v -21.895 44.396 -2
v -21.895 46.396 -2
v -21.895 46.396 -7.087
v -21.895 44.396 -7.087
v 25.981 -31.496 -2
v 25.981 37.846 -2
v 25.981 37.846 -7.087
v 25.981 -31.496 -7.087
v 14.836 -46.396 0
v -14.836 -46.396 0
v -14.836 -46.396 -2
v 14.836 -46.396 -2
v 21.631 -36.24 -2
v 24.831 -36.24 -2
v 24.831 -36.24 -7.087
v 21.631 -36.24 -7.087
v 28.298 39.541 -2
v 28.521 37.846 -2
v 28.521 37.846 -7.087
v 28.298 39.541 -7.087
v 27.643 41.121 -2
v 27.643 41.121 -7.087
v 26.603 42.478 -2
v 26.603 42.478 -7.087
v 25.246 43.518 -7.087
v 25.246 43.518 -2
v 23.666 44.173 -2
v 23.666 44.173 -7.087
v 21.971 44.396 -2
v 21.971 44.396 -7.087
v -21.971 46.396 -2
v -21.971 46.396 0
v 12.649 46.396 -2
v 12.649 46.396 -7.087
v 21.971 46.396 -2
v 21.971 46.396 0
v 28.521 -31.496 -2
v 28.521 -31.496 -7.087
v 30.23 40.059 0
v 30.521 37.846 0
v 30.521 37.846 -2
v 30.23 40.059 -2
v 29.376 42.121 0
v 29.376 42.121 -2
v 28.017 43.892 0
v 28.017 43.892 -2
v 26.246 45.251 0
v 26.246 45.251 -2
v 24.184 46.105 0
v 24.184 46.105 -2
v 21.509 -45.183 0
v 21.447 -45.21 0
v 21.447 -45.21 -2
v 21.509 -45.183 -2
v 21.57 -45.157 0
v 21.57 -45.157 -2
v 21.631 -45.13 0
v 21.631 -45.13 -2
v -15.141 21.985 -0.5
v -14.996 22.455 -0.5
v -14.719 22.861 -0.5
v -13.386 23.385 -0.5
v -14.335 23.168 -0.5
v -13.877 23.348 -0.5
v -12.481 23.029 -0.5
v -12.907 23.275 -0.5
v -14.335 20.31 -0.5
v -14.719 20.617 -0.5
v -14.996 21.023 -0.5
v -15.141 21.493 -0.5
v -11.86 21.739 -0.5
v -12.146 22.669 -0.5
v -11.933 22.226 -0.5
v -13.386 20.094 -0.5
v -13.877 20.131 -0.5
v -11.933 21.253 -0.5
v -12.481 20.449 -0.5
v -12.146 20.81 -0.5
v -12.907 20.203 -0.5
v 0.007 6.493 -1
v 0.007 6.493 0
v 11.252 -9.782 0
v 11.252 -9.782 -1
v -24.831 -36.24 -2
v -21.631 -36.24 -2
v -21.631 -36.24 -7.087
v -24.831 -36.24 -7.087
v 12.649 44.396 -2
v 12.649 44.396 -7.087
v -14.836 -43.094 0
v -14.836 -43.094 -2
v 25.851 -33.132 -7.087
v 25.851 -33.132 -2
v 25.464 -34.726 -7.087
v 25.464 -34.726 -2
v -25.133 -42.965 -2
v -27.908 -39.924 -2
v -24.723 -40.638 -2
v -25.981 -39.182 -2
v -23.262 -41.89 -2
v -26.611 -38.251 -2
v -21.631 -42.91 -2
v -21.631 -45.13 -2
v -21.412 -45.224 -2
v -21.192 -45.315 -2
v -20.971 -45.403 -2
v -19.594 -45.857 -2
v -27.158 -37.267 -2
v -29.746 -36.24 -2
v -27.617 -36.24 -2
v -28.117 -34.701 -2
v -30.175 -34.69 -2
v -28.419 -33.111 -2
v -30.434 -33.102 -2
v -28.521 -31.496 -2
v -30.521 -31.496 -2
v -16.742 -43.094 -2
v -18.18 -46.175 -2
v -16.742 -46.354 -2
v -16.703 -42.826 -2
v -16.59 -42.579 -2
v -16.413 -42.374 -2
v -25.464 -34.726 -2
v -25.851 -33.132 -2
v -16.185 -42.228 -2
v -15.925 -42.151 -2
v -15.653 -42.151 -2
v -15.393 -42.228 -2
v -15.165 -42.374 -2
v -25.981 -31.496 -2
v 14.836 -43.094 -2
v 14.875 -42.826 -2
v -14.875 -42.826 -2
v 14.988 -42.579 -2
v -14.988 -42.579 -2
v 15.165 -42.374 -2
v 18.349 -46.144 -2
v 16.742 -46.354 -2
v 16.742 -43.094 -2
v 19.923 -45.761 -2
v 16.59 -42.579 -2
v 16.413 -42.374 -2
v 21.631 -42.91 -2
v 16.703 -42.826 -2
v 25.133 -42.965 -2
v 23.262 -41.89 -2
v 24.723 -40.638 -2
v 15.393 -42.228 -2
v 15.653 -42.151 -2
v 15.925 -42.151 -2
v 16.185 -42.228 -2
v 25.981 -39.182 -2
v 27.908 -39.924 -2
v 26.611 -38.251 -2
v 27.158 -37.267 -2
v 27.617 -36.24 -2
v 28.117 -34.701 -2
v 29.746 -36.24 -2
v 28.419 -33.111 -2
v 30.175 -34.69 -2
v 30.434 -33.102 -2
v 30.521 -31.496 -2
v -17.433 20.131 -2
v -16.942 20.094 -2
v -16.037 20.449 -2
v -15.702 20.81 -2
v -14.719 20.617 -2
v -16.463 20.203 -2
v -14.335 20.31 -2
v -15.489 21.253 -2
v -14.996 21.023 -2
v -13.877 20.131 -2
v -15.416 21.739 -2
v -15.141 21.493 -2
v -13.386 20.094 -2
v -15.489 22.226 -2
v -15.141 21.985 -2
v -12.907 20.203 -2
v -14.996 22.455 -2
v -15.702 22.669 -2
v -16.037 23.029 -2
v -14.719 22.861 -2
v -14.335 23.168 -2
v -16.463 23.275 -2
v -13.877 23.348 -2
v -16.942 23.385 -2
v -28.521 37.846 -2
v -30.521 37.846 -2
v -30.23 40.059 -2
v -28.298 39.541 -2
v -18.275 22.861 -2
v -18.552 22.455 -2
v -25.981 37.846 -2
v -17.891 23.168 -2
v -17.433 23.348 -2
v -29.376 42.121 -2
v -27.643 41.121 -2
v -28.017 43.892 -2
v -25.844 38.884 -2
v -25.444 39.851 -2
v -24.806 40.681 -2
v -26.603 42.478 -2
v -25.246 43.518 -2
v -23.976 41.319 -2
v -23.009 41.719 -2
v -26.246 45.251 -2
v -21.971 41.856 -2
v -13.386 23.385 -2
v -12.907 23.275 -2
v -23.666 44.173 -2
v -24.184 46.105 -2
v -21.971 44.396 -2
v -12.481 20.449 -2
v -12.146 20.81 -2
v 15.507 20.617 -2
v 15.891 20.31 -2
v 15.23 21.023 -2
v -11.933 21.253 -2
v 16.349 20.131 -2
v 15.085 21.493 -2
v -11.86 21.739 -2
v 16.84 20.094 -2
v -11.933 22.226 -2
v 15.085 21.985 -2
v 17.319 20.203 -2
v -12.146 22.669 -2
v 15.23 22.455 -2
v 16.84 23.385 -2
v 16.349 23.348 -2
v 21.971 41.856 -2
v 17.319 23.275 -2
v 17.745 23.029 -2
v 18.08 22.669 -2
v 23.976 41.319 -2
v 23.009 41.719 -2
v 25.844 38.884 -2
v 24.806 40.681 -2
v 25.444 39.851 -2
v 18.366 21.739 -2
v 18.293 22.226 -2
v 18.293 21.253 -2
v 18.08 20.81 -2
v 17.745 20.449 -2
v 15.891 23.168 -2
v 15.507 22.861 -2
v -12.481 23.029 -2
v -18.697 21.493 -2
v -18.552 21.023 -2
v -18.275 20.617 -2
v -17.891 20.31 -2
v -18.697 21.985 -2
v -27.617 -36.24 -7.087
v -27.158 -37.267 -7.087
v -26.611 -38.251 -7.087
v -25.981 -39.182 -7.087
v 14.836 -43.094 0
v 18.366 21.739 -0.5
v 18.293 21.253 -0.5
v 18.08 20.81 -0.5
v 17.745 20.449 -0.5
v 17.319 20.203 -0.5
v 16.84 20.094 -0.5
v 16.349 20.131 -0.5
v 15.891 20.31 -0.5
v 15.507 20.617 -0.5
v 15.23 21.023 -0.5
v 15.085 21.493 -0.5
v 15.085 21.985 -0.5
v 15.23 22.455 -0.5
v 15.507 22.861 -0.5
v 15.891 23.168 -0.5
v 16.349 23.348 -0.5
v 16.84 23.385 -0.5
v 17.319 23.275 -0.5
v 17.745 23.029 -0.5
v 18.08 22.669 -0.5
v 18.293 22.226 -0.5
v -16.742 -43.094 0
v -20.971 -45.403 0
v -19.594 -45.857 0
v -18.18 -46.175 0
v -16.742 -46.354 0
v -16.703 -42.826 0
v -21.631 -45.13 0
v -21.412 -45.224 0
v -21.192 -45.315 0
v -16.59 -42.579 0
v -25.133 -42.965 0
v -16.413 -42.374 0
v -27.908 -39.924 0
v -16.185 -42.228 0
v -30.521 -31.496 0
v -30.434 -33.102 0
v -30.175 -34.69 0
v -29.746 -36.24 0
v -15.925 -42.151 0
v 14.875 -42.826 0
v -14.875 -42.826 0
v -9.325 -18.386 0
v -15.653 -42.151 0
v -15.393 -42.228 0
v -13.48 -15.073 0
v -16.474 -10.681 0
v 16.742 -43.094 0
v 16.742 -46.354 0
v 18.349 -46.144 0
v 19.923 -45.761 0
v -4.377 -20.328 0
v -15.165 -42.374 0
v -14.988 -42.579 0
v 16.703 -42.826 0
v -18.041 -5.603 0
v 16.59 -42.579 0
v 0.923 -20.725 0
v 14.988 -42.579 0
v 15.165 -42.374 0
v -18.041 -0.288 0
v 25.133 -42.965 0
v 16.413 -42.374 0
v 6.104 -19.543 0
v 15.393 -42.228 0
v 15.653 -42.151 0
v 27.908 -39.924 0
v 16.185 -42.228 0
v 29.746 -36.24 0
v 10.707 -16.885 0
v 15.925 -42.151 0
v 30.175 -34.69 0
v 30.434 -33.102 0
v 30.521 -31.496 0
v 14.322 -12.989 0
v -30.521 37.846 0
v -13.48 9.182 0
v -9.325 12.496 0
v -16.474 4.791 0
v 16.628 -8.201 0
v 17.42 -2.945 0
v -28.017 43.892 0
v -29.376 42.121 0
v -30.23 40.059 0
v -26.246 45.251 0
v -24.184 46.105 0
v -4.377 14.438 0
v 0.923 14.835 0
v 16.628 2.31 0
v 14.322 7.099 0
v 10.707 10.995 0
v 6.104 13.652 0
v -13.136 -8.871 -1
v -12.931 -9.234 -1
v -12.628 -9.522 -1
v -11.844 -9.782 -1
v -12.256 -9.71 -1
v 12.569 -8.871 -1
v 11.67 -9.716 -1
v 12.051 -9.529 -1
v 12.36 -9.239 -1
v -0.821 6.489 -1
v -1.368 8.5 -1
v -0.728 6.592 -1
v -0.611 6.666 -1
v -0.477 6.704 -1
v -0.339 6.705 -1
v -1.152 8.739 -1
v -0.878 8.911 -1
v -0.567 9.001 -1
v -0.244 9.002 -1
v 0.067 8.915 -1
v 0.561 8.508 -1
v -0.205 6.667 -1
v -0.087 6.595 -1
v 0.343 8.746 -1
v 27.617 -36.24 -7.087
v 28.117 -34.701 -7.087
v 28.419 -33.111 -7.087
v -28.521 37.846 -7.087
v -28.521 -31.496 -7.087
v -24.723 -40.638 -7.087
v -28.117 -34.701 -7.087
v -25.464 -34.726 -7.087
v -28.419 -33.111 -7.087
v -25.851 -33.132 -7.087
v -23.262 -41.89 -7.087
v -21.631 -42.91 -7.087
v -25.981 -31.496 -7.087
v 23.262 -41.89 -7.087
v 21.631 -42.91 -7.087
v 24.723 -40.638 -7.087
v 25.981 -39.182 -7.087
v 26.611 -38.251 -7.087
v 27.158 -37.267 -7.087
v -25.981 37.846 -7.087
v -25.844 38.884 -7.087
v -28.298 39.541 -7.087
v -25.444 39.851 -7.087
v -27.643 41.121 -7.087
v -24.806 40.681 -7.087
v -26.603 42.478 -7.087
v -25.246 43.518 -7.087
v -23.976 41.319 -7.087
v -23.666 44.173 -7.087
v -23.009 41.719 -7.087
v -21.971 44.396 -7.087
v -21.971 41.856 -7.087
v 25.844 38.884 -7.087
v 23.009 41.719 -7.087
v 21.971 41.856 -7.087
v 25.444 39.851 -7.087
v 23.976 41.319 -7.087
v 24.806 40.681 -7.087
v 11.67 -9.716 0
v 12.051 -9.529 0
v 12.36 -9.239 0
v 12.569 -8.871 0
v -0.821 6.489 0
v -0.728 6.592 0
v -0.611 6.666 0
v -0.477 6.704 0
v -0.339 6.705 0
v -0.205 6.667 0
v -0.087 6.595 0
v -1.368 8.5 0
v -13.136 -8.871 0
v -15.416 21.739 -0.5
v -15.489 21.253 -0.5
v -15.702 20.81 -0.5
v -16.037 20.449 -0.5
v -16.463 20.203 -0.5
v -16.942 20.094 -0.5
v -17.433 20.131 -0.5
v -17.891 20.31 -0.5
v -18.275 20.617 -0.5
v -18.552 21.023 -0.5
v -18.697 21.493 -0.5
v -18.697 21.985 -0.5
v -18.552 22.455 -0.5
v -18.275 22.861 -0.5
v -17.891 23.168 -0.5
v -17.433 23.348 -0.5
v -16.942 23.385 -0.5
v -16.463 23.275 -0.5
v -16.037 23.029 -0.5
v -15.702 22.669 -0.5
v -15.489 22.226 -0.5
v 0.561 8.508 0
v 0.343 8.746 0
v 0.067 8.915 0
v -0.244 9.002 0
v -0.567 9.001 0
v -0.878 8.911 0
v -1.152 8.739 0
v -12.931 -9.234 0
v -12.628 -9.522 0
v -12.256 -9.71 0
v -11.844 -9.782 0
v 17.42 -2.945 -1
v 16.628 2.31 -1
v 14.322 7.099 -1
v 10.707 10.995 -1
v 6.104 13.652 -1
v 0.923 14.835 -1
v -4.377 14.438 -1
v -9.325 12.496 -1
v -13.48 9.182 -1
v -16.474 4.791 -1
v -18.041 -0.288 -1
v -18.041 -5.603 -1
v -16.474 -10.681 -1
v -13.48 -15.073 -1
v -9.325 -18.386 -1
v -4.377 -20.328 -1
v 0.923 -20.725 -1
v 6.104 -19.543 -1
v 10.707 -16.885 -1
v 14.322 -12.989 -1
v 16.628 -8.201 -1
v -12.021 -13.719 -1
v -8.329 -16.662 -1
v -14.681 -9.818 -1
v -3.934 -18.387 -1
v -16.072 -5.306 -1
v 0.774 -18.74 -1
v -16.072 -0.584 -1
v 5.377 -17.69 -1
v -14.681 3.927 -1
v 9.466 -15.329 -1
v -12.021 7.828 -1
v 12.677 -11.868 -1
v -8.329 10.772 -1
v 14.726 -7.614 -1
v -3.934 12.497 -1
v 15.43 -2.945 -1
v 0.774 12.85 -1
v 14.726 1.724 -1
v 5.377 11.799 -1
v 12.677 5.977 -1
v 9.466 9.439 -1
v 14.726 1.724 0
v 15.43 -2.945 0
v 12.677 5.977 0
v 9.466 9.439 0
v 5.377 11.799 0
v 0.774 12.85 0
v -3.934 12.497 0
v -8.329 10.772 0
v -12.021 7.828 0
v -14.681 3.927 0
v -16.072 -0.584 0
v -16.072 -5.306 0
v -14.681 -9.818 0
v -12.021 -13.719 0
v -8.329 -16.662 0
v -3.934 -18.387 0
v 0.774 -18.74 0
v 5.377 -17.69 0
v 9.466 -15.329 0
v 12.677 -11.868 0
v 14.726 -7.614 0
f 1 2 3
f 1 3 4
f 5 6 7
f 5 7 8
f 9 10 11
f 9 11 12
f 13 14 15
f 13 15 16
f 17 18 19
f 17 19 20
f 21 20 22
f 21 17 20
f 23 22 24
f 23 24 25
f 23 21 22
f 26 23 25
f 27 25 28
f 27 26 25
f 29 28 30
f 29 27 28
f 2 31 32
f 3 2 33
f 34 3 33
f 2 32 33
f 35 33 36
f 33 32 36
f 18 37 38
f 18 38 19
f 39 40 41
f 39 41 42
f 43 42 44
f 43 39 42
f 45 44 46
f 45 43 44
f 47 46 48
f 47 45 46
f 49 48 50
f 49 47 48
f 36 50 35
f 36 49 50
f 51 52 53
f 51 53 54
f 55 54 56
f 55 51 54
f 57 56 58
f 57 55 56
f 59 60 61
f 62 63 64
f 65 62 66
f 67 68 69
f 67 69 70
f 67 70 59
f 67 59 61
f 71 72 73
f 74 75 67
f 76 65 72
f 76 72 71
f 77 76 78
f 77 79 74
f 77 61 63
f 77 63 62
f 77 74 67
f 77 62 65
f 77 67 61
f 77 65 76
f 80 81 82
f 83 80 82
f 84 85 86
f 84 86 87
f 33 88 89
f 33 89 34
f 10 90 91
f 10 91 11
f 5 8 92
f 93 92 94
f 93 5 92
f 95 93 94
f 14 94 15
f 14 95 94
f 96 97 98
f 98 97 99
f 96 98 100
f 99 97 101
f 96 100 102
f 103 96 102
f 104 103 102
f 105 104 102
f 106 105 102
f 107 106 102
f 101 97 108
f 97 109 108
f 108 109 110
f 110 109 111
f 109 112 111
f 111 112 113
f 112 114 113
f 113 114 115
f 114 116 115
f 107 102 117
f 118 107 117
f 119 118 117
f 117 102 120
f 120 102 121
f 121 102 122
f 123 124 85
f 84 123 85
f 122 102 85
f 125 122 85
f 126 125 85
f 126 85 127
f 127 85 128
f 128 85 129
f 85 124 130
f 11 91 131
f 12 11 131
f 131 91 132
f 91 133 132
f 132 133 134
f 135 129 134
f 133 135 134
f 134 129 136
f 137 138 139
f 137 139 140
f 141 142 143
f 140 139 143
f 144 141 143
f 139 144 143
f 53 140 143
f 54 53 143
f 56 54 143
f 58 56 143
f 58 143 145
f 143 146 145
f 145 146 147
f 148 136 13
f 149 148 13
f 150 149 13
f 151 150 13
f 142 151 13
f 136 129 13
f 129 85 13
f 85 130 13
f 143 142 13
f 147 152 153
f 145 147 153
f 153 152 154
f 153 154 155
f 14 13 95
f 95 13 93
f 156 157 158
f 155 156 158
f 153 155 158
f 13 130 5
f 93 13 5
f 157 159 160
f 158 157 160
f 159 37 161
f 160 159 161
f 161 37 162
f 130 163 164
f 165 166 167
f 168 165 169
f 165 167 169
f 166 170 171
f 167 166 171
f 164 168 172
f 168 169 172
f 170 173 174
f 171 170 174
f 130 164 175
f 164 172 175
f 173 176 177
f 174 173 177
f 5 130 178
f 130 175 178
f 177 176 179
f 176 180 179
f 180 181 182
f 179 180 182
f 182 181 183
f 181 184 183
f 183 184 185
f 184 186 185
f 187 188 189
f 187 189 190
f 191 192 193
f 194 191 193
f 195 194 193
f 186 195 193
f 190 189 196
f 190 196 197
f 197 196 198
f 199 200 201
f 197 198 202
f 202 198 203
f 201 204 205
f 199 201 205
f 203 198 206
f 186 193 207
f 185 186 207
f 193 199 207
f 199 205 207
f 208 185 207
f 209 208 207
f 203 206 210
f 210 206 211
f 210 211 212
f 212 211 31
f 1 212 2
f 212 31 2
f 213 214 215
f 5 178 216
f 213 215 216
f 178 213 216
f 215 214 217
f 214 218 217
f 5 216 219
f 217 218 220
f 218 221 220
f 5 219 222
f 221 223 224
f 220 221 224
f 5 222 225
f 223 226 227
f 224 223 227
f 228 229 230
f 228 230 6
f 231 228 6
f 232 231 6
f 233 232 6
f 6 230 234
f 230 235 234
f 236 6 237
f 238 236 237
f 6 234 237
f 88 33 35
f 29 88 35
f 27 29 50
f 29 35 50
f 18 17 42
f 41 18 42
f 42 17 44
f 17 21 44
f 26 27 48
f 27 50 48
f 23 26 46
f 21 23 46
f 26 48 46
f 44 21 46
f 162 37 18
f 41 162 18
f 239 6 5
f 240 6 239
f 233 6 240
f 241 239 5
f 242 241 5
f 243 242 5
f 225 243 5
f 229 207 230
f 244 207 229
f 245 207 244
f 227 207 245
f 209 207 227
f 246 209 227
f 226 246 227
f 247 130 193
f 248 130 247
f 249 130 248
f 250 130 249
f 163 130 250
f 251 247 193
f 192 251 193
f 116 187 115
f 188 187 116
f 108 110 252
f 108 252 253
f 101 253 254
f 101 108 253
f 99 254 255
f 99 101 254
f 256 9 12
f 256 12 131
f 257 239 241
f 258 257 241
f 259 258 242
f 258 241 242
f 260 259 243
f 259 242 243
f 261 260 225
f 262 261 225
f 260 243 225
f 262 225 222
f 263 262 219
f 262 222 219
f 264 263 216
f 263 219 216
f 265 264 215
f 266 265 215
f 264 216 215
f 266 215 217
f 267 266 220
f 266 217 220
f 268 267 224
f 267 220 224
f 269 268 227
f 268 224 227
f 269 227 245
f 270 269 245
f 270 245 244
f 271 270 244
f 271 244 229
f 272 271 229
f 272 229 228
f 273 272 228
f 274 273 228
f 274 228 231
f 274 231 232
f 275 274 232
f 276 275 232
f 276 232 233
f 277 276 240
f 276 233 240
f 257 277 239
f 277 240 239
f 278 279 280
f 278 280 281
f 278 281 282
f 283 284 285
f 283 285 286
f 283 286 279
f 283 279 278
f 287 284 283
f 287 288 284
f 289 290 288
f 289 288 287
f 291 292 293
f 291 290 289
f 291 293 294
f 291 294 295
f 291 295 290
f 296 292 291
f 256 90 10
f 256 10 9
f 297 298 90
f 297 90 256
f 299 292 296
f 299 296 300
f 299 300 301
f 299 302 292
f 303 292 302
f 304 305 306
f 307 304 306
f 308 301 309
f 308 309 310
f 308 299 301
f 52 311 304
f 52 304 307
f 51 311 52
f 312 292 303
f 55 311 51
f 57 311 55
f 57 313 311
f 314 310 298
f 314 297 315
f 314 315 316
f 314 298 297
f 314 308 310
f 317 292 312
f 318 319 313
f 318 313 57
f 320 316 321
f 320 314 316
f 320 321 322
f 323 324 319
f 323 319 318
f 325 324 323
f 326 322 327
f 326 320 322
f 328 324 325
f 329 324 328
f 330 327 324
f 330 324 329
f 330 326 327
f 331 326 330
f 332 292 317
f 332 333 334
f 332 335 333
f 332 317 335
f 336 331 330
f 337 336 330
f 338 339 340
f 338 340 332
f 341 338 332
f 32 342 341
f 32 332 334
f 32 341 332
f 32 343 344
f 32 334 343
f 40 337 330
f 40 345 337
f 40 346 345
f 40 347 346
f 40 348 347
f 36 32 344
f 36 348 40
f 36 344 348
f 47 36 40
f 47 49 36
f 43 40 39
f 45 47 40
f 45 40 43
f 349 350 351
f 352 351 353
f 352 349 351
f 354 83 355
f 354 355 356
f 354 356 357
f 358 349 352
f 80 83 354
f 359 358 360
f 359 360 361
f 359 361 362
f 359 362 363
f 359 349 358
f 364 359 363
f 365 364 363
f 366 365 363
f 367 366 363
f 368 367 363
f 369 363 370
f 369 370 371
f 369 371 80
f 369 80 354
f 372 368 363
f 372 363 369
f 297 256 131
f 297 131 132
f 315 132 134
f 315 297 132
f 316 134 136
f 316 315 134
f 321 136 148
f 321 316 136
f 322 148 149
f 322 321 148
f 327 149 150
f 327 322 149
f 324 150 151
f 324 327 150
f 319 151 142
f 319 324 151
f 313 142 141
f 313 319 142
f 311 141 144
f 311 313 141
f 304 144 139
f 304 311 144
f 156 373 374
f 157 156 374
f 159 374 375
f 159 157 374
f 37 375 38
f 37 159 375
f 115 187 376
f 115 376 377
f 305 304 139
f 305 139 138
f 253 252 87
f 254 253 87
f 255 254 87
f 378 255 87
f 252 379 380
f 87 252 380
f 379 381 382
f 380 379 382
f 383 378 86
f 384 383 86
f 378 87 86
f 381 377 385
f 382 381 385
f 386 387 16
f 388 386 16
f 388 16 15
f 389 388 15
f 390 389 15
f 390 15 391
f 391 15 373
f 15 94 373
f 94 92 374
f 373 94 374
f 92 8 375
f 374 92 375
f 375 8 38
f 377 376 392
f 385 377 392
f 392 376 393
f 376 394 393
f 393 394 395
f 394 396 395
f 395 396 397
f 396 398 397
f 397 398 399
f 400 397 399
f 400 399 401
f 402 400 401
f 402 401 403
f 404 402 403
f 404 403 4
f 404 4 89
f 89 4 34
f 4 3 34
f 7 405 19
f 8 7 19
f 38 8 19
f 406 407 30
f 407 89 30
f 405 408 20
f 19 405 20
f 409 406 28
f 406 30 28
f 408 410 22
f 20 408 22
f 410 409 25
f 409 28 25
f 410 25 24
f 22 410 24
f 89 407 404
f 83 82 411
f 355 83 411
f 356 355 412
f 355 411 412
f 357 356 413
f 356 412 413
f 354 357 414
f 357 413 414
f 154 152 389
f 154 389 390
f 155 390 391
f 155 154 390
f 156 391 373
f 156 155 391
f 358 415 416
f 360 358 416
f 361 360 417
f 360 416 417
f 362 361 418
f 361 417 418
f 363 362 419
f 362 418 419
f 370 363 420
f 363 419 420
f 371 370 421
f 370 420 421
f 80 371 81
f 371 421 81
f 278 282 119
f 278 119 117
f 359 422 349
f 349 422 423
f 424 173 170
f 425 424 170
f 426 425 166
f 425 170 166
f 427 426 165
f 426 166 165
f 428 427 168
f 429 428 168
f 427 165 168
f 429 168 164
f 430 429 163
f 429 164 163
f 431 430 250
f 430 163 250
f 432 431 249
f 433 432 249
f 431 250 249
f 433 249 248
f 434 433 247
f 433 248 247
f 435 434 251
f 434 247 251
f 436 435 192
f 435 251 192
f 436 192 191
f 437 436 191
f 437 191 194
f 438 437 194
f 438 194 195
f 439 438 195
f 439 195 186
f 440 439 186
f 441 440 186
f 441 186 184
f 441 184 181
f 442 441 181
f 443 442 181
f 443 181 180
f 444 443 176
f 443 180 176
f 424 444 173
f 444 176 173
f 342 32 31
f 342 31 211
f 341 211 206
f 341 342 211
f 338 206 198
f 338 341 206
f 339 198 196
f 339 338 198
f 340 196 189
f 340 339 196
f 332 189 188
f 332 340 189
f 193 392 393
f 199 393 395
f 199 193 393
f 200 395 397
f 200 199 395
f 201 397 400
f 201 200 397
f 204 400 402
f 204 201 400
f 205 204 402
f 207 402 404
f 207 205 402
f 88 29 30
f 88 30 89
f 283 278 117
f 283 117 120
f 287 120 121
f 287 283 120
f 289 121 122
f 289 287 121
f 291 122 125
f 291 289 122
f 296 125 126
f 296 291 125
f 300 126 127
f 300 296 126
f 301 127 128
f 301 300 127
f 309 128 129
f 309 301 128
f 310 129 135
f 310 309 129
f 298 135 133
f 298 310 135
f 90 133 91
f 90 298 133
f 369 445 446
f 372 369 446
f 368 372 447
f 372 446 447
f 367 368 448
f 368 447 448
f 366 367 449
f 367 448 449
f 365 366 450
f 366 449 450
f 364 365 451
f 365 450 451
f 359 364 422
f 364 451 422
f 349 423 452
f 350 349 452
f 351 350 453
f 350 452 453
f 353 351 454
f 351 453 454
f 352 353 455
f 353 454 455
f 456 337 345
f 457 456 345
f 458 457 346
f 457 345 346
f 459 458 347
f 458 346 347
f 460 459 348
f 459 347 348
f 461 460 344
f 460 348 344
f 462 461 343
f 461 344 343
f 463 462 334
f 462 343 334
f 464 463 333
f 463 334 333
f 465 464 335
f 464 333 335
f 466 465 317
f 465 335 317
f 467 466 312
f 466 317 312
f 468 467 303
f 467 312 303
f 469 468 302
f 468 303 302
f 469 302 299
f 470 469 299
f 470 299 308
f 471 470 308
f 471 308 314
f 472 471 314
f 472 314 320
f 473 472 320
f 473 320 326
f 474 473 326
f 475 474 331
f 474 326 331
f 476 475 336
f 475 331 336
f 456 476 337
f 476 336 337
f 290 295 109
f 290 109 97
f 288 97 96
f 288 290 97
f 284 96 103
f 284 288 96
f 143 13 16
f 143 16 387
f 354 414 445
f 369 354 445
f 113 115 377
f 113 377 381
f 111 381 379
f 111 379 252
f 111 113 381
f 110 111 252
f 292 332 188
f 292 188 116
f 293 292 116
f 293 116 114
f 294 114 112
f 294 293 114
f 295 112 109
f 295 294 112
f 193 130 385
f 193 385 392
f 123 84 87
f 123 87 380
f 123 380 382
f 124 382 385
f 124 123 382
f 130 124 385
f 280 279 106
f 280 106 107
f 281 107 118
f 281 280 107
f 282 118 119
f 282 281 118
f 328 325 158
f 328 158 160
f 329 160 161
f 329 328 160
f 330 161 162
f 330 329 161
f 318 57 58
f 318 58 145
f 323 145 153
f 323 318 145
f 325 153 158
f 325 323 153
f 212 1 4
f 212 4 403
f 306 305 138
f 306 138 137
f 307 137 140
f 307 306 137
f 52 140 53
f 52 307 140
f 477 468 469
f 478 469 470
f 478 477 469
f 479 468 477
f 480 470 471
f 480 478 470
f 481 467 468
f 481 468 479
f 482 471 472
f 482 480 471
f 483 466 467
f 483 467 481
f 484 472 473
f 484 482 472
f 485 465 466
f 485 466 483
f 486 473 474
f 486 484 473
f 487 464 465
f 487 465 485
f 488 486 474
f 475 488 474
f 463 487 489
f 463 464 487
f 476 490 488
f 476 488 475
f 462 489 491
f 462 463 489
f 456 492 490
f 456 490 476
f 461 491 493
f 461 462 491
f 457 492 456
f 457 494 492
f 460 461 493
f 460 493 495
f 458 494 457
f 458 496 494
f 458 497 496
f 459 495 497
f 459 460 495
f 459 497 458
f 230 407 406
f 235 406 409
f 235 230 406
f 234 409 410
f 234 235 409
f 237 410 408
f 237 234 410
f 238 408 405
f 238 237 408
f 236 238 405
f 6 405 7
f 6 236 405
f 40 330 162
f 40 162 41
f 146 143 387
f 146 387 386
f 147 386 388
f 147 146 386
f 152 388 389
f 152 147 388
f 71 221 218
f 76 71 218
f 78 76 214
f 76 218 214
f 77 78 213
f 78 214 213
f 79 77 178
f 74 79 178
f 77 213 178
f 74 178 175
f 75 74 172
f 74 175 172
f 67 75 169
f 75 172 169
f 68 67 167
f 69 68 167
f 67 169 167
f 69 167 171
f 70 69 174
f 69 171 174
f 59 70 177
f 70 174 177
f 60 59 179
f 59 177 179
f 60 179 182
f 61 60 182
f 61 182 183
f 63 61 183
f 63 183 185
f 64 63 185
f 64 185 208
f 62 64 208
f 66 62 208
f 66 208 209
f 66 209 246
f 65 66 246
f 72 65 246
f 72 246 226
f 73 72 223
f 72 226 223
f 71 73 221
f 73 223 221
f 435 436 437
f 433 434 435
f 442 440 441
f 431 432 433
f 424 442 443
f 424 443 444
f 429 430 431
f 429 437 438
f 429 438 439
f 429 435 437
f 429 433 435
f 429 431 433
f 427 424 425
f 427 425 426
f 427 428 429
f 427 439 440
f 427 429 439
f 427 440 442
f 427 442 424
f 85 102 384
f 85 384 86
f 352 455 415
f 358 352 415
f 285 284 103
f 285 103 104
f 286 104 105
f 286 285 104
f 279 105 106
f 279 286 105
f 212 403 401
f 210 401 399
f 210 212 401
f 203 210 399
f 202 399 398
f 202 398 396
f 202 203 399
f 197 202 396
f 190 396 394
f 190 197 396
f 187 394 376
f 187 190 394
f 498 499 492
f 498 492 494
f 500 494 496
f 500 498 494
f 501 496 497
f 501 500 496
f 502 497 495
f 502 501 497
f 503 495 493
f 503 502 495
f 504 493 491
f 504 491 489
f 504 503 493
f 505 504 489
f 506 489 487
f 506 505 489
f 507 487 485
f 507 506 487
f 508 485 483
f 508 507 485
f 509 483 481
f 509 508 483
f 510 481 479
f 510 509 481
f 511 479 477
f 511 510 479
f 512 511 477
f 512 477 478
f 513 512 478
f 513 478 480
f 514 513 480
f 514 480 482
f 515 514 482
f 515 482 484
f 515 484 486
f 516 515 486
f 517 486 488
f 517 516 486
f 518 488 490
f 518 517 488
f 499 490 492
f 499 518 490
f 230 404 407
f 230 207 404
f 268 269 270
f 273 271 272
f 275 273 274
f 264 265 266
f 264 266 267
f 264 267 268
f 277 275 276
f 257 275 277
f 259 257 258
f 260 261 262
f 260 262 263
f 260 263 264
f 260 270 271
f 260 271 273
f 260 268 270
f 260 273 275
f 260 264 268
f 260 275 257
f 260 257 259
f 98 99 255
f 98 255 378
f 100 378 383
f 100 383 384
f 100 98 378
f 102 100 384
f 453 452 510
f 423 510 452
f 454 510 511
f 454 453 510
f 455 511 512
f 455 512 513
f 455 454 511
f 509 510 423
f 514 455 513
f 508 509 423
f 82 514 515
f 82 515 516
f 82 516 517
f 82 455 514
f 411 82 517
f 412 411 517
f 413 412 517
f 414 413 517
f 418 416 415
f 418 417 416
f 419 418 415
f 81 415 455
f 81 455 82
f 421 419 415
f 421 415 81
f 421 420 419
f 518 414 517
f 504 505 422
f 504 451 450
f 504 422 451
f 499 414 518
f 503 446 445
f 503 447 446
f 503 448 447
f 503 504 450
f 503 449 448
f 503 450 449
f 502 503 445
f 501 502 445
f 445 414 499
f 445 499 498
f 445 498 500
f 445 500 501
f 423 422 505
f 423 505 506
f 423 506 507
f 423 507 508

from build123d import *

# Parameters (mm, degrees)
F0_W     = 34.544
F0_H     = 0.2
F0_H_2   = 2
F1_DEPTH = 7.0866
F0_W_2   = 29.673
F2_DEPTH = 2
F0_W_3   = 2.34
F0_H_3   = 4.318
F0_W_4   = 0.2
F3_DEPTH = 7.0866
F4_R     = 17.8300566071
F4_R_2   = 15.8393710275
F5_DEPTH = 1
F6_R     = 1.65
F7_DEPTH = 1.5


with BuildPart() as f1:
    # F0 (on Top) → F1 (new body)
    with BuildSketch(Plane.XY):
        Polygon((12.6492, 41.856), (12.6492, 44.196), (-21.8948, 44.196), (-21.8948, 42.396), (-21.8948, 41.856), align=None)
        with Locations((-4.6228, 44.296)):
            Rectangle(F0_W, F0_H)
        with BuildLine():
            Line((-21.8948, 42.396), (-21.8948, 44.196))
            Line((-21.8948, 44.196), (-21.971, 44.196))
            ThreePointArc((-21.971, 44.196), (-26.4611280605, 42.3361280605), (-28.321, 37.846))
            Line((-28.321, 37.846), (-28.321, -31.496))
            ThreePointArc((-28.321, -31.496), (-28.0890375223, -33.9122037045), (-27.4016235683, -36.2401446376))
            Line((-27.4016235683, -36.2401446376), (-25.981, -36.2401446376))
            Line((-25.981, -36.2401446376), (-25.981, -31.496))
            Line((-25.981, -31.496), (-25.981, 37.846))
            ThreePointArc((-25.981, 37.846), (-24.8064981926, 40.6814981926), (-21.971, 41.856))
            Line((-21.971, 41.856), (-21.8948, 41.856))
            Line((-21.8948, 41.856), (-21.8948, 42.396))
        make_face()
        with Locations((-4.6228, 45.396)):
            Rectangle(F0_W, F0_H_2)
    extrude(amount=-F1_DEPTH)

    # F0 (on Top) → F2 (join)
    with BuildSketch(Plane.XY):
        with BuildLine():
            Line((12.6492, 46.396), (12.6492, 44.396))
            Line((12.6492, 44.396), (21.971, 44.396))
            ThreePointArc((21.971, 44.396), (26.6025494168, 42.4775494168), (28.521, 37.846))
            Line((28.521, 37.846), (28.521, 33.8582))
            Line((28.521, 33.8582), (28.521, 29.5402))
            Line((28.521, 29.5402), (28.521, -31.496))
            ThreePointArc((28.521, -31.496), (28.2929750434, -33.910756406), (27.6169614728, -36.2401446376))
            Line((27.6169614728, -36.2401446376), (29.7455563349, -36.2401446376))
            ThreePointArc((29.7455563349, -36.2401446376), (30.3258612606, -33.8995505622), (30.521, -31.496))
            Line((30.521, -31.496), (30.521, 37.846))
            ThreePointArc((30.521, 37.846), (28.0167629791, 43.8917629791), (21.971, 46.396))
            Line((21.971, 46.396), (12.6492, 46.396))
        make_face()
        with BuildLine():
            ThreePointArc((16.7415, -46.3538087129), (19.1412490439, -45.9741851994), (21.4474, -45.2096086804))
            Line((21.4474, -45.2096086804), (21.4474, -43.0052598824))
            ThreePointArc((21.4474, -43.0052598824), (19.1586666659, -43.9014389105), (16.7415, -44.347244288))
            Line((16.7415, -44.347244288), (16.7415, -46.3538087129))
        make_face()
        with BuildLine():
            Line((21.971, 41.856), (12.6492, 41.856))
            Line((12.6492, 41.856), (-21.8948, 41.856))
            Line((-21.8948, 41.856), (-21.971, 41.856))
            ThreePointArc((-21.971, 41.856), (-24.8064981926, 40.6814981926), (-25.981, 37.846))
            Line((-25.981, 37.846), (-25.981, -31.496))
            ThreePointArc((-25.981, -31.496), (-25.6893764307, -33.9367777552), (-24.8309235424, -36.2401446376))
            Line((-24.8309235424, -36.2401446376), (-21.631, -36.2401446376))
            Line((-21.631, -36.2401446376), (-21.631, -39.9345721541))
            ThreePointArc((-21.631, -39.9345721541), (-18.7758369596, -41.3639584392), (-15.621, -41.856))
            Line((-15.621, -41.856), (15.621, -41.856))
            ThreePointArc((15.621, -41.856), (18.7758369596, -41.3639584392), (21.631, -39.9345721541))
            Line((21.631, -39.9345721541), (21.631, -36.2401446376))
            Line((21.631, -36.2401446376), (24.8309235424, -36.2401446376))
            ThreePointArc((24.8309235424, -36.2401446376), (25.6893764307, -33.9367777552), (25.981, -31.496))
            Line((25.981, -31.496), (25.981, 29.5402))
            Line((25.981, 29.5402), (25.981, 33.8582))
            Line((25.981, 33.8582), (25.981, 37.846))
            ThreePointArc((25.981, 37.846), (24.8064981926, 40.6814981926), (21.971, 41.856))
        make_face()
        with Locations((0, -45.396)):
            Rectangle(F0_W_2, F0_H_2)
        with BuildLine():
            Line((-21.971, 44.396), (-21.8948, 44.396))
            Line((-21.8948, 44.396), (-21.8948, 46.396))
            Line((-21.8948, 46.396), (-21.971, 46.396))
            ThreePointArc((-21.971, 46.396), (-28.0167629791, 43.8917629791), (-30.521, 37.846))
            Line((-30.521, 37.846), (-30.521, -31.496))
            ThreePointArc((-30.521, -31.496), (-30.3258612606, -33.8995505622), (-29.7455563349, -36.2401446376))
            Line((-29.7455563349, -36.2401446376), (-27.6169614728, -36.2401446376))
            ThreePointArc((-27.6169614728, -36.2401446376), (-28.2929750434, -33.910756406), (-28.521, -31.496))
            Line((-28.521, -31.496), (-28.521, 37.846))
            ThreePointArc((-28.521, 37.846), (-26.6025494168, 42.4775494168), (-21.971, 44.396))
        make_face()
        with Locations((0, -44.296)):
            Rectangle(F0_W_2, F0_H)
        with BuildLine():
            Line((-16.7415, -46.3538087129), (-16.7415, -44.347244288))
            ThreePointArc((-16.7415, -44.347244288), (-18.9035466854, -43.9713712273), (-20.9706, -43.2344743404))
            Line((-20.9706, -43.2344743404), (-20.9706, -45.4025373059))
            ThreePointArc((-20.9706, -45.4025373059), (-18.8908284091, -46.0327885785), (-16.7415, -46.3538087129))
        make_face()
        with BuildLine():
            Line((21.631, -42.9104601274), (21.631, -42.6839354664))
            ThreePointArc((21.631, -42.6839354664), (19.2604727553, -43.663343098), (16.7415, -44.146473499))
            Line((16.7415, -44.146473499), (16.7415, -44.347244288))
            ThreePointArc((16.7415, -44.347244288), (19.1586666659, -43.9014389105), (21.4474, -43.0052598824))
            ThreePointArc((21.4474, -43.0052598824), (21.5393898138, -42.95822762), (21.631, -42.9104601274))
        make_face()
        with BuildLine():
            ThreePointArc((16.7415, -44.146473499), (19.2604727553, -43.663343098), (21.631, -42.6839354664))
            Line((21.631, -42.6839354664), (21.631, -39.9345721541))
            ThreePointArc((21.631, -39.9345721541), (18.7758369596, -41.3639584392), (15.621, -41.856))
            Line((15.621, -41.856), (-15.621, -41.856))
            ThreePointArc((-15.621, -41.856), (-18.7758369596, -41.3639584392), (-21.631, -39.9345721541))
            Line((-21.631, -39.9345721541), (-21.631, -42.6839354664))
            ThreePointArc((-21.631, -42.6839354664), (-19.2604727553, -43.663343098), (-16.7415, -44.146473499))
            Line((-16.7415, -44.146473499), (-16.7415, -43.094))
            ThreePointArc((-16.7415, -43.094), (-15.789, -42.1415), (-14.8365, -43.094))
            Line((-14.8365, -43.094), (-14.8365, -44.196))
            Line((-14.8365, -44.196), (14.8365, -44.196))
            Line((14.8365, -44.196), (14.8365, -43.094))
            ThreePointArc((14.8365, -43.094), (15.789, -42.1415), (16.7415, -43.094))
            Line((16.7415, -43.094), (16.7415, -44.146473499))
        make_face()
        with BuildLine():
            Line((29.7455563349, -36.2401446376), (27.6169614728, -36.2401446376))
            ThreePointArc((27.6169614728, -36.2401446376), (26.8953708022, -37.7648565954), (25.981, -39.1823775603))
            ThreePointArc((25.981, -39.1823775603), (24.0155741349, -41.2909540628), (21.631, -42.9104601274))
            Line((21.631, -42.9104601274), (21.631, -45.1301446376))
            ThreePointArc((21.631, -45.1301446376), (26.6259132073, -41.5409930463), (29.7455563349, -36.2401446376))
        make_face()
        with BuildLine():
            ThreePointArc((21.631, -39.9345721541), (23.4519461004, -38.2787636825), (24.8309235424, -36.2401446376))
            Line((24.8309235424, -36.2401446376), (21.631, -36.2401446376))
            Line((21.631, -36.2401446376), (21.631, -39.9345721541))
        make_face()
        with BuildLine():
            Line((-21.631, -36.2401446376), (-24.8309235424, -36.2401446376))
            ThreePointArc((-24.8309235424, -36.2401446376), (-23.4519461004, -38.2787636825), (-21.631, -39.9345721541))
            Line((-21.631, -39.9345721541), (-21.631, -36.2401446376))
        make_face()
        with BuildLine():
            ThreePointArc((-25.981, -39.1823775603), (-26.8953708022, -37.7648565954), (-27.6169614728, -36.2401446376))
            Line((-27.6169614728, -36.2401446376), (-29.7455563349, -36.2401446376))
            ThreePointArc((-29.7455563349, -36.2401446376), (-26.6259132073, -41.5409930463), (-21.631, -45.1301446376))
            Line((-21.631, -45.1301446376), (-21.631, -42.9104601274))
            ThreePointArc((-21.631, -42.9104601274), (-24.0155741349, -41.2909540628), (-25.981, -39.1823775603))
        make_face()
        with BuildLine():
            ThreePointArc((-20.9706, -43.2344743404), (-21.3031100256, -43.0771754869), (-21.631, -42.9104601274))
            Line((-21.631, -42.9104601274), (-21.631, -45.1301446376))
            ThreePointArc((-21.631, -45.1301446376), (-21.3024326962, -45.2702993476), (-20.9706, -45.4025373059))
            Line((-20.9706, -45.4025373059), (-20.9706, -43.2344743404))
        make_face()
        with BuildLine():
            ThreePointArc((21.4474, -45.2096086804), (21.5393333696, -45.1701848067), (21.631, -45.1301446376))
            Line((21.631, -45.1301446376), (21.631, -42.9104601274))
            ThreePointArc((21.631, -42.9104601274), (21.5393898138, -42.95822762), (21.4474, -43.0052598824))
            Line((21.4474, -43.0052598824), (21.4474, -45.2096086804))
        make_face()
        with BuildLine():
            ThreePointArc((-16.7415, -44.146473499), (-19.2604727553, -43.663343098), (-21.631, -42.6839354664))
            Line((-21.631, -42.6839354664), (-21.631, -42.9104601274))
            ThreePointArc((-21.631, -42.9104601274), (-21.3031100256, -43.0771754869), (-20.9706, -43.2344743404))
            ThreePointArc((-20.9706, -43.2344743404), (-18.9035466854, -43.9713712273), (-16.7415, -44.347244288))
            Line((-16.7415, -44.347244288), (-16.7415, -44.146473499))
        make_face()
    extrude(amount=-F2_DEPTH)

    # F0 (on Top) → F3 (join)
    with BuildSketch(Plane.XY):
        with BuildLine():
            Line((-21.8948, 42.396), (-21.8948, 44.196))
            Line((-21.8948, 44.196), (-21.971, 44.196))
            ThreePointArc((-21.971, 44.196), (-26.4611280605, 42.3361280605), (-28.321, 37.846))
            Line((-28.321, 37.846), (-28.321, -31.496))
            ThreePointArc((-28.321, -31.496), (-28.0890375223, -33.9122037045), (-27.4016235683, -36.2401446376))
            Line((-27.4016235683, -36.2401446376), (-25.981, -36.2401446376))
            Line((-25.981, -36.2401446376), (-25.981, -31.496))
            Line((-25.981, -31.496), (-25.981, 37.846))
            ThreePointArc((-25.981, 37.846), (-24.8064981926, 40.6814981926), (-21.971, 41.856))
            Line((-21.971, 41.856), (-21.8948, 41.856))
            Line((-21.8948, 41.856), (-21.8948, 42.396))
        make_face()
        with BuildLine():
            ThreePointArc((28.321, 37.846), (26.4611280605, 42.3361280605), (21.971, 44.196))
            Line((21.971, 44.196), (12.6492, 44.196))
            Line((12.6492, 44.196), (12.6492, 41.856))
            Line((12.6492, 41.856), (21.971, 41.856))
            ThreePointArc((21.971, 41.856), (24.8064981926, 40.6814981926), (25.981, 37.846))
            Line((25.981, 37.846), (25.981, 33.8582))
            Line((25.981, 33.8582), (28.321, 33.8582))
            Line((28.321, 33.8582), (28.321, 37.846))
        make_face()
        with Locations((27.151, 31.6992)):
            Rectangle(F0_W_3, F0_H_3)
        with BuildLine():
            Line((28.321, -31.496), (28.321, 29.5402))
            Line((28.321, 29.5402), (25.981, 29.5402))
            Line((25.981, 29.5402), (25.981, -31.496))
            Line((25.981, -31.496), (25.981, -36.2401446376))
            Line((25.981, -36.2401446376), (27.4016235683, -36.2401446376))
            ThreePointArc((27.4016235683, -36.2401446376), (28.0890375223, -33.9122037045), (28.321, -31.496))
        make_face()
        with BuildLine():
            Line((12.6492, 44.196), (21.971, 44.196))
            ThreePointArc((21.971, 44.196), (26.4611280605, 42.3361280605), (28.321, 37.846))
            Line((28.321, 37.846), (28.321, 33.8582))
            Line((28.321, 33.8582), (28.521, 33.8582))
            Line((28.521, 33.8582), (28.521, 37.846))
            ThreePointArc((28.521, 37.846), (26.6025494168, 42.4775494168), (21.971, 44.396))
            Line((21.971, 44.396), (12.6492, 44.396))
            Line((12.6492, 44.396), (12.6492, 44.196))
        make_face()
        with Locations((28.421, 31.6992)):
            Rectangle(F0_W_4, F0_H_3)
        with BuildLine():
            Line((28.521, 29.5402), (28.321, 29.5402))
            Line((28.321, 29.5402), (28.321, -31.496))
            ThreePointArc((28.321, -31.496), (28.0890375223, -33.9122037045), (27.4016235683, -36.2401446376))
            Line((27.4016235683, -36.2401446376), (27.6169614728, -36.2401446376))
            ThreePointArc((27.6169614728, -36.2401446376), (28.2929750434, -33.910756406), (28.521, -31.496))
            Line((28.521, -31.496), (28.521, 29.5402))
        make_face()
        with BuildLine():
            Line((-21.971, 44.196), (-21.8948, 44.196))
            Line((-21.8948, 44.196), (-21.8948, 44.396))
            Line((-21.8948, 44.396), (-21.971, 44.396))
            ThreePointArc((-21.971, 44.396), (-26.6025494168, 42.4775494168), (-28.521, 37.846))
            Line((-28.521, 37.846), (-28.521, -31.496))
            ThreePointArc((-28.521, -31.496), (-28.2929750434, -33.910756406), (-27.6169614728, -36.2401446376))
            Line((-27.6169614728, -36.2401446376), (-27.4016235683, -36.2401446376))
            ThreePointArc((-27.4016235683, -36.2401446376), (-28.0890375223, -33.9122037045), (-28.321, -31.496))
            Line((-28.321, -31.496), (-28.321, 37.846))
            ThreePointArc((-28.321, 37.846), (-26.4611280605, 42.3361280605), (-21.971, 44.196))
        make_face()
        with BuildLine():
            ThreePointArc((-24.8309235424, -36.2401446376), (-25.6893764307, -33.9367777552), (-25.981, -31.496))
            Line((-25.981, -31.496), (-25.981, -36.2401446376))
            Line((-25.981, -36.2401446376), (-24.8309235424, -36.2401446376))
        make_face()
        with BuildLine():
            Line((-25.981, -36.2401446376), (-27.4016235683, -36.2401446376))
            ThreePointArc((-27.4016235683, -36.2401446376), (-26.7674757756, -37.5825489223), (-25.981, -38.8417742955))
            Line((-25.981, -38.8417742955), (-25.981, -36.2401446376))
        make_face()
        with BuildLine():
            Line((-25.981, -36.2401446376), (-25.981, -38.8417742955))
            ThreePointArc((-25.981, -38.8417742955), (-24.0284238394, -41.0146776594), (-21.631, -42.6839354664))
            Line((-21.631, -42.6839354664), (-21.631, -39.9345721541))
            ThreePointArc((-21.631, -39.9345721541), (-23.4519461004, -38.2787636825), (-24.8309235424, -36.2401446376))
            Line((-24.8309235424, -36.2401446376), (-25.981, -36.2401446376))
        make_face()
        with BuildLine():
            Line((-21.631, -36.2401446376), (-24.8309235424, -36.2401446376))
            ThreePointArc((-24.8309235424, -36.2401446376), (-23.4519461004, -38.2787636825), (-21.631, -39.9345721541))
            Line((-21.631, -39.9345721541), (-21.631, -36.2401446376))
        make_face()
        with BuildLine():
            ThreePointArc((-25.981, -38.8417742955), (-26.7674757756, -37.5825489223), (-27.4016235683, -36.2401446376))
            Line((-27.4016235683, -36.2401446376), (-27.6169614728, -36.2401446376))
            ThreePointArc((-27.6169614728, -36.2401446376), (-26.8953708022, -37.7648565954), (-25.981, -39.1823775603))
            Line((-25.981, -39.1823775603), (-25.981, -38.8417742955))
        make_face()
        with BuildLine():
            ThreePointArc((-21.631, -42.6839354664), (-24.0284238394, -41.0146776594), (-25.981, -38.8417742955))
            Line((-25.981, -38.8417742955), (-25.981, -39.1823775603))
            ThreePointArc((-25.981, -39.1823775603), (-24.0155741349, -41.2909540628), (-21.631, -42.9104601274))
            Line((-21.631, -42.9104601274), (-21.631, -42.6839354664))
        make_face()
        with BuildLine():
            Line((25.981, -36.2401446376), (25.981, -31.496))
            ThreePointArc((25.981, -31.496), (25.6893764307, -33.9367777552), (24.8309235424, -36.2401446376))
            Line((24.8309235424, -36.2401446376), (25.981, -36.2401446376))
        make_face()
        with BuildLine():
            ThreePointArc((25.981, -38.8417742955), (26.7674757756, -37.5825489223), (27.4016235683, -36.2401446376))
            Line((27.4016235683, -36.2401446376), (25.981, -36.2401446376))
            Line((25.981, -36.2401446376), (25.981, -38.8417742955))
        make_face()
        with BuildLine():
            ThreePointArc((21.631, -42.6839354664), (24.0284238394, -41.0146776594), (25.981, -38.8417742955))
            Line((25.981, -38.8417742955), (25.981, -36.2401446376))
            Line((25.981, -36.2401446376), (24.8309235424, -36.2401446376))
            ThreePointArc((24.8309235424, -36.2401446376), (23.4519461004, -38.2787636825), (21.631, -39.9345721541))
            Line((21.631, -39.9345721541), (21.631, -42.6839354664))
        make_face()
        with BuildLine():
            Line((25.981, -39.1823775603), (25.981, -38.8417742955))
            ThreePointArc((25.981, -38.8417742955), (24.0284238394, -41.0146776594), (21.631, -42.6839354664))
            Line((21.631, -42.6839354664), (21.631, -42.9104601274))
            ThreePointArc((21.631, -42.9104601274), (24.0155741349, -41.2909540628), (25.981, -39.1823775603))
        make_face()
        with BuildLine():
            Line((27.6169614728, -36.2401446376), (27.4016235683, -36.2401446376))
            ThreePointArc((27.4016235683, -36.2401446376), (26.7674757756, -37.5825489223), (25.981, -38.8417742955))
            Line((25.981, -38.8417742955), (25.981, -39.1823775603))
            ThreePointArc((25.981, -39.1823775603), (26.8953708022, -37.7648565954), (27.6169614728, -36.2401446376))
        make_face()
        with BuildLine():
            ThreePointArc((21.631, -39.9345721541), (23.4519461004, -38.2787636825), (24.8309235424, -36.2401446376))
            Line((24.8309235424, -36.2401446376), (21.631, -36.2401446376))
            Line((21.631, -36.2401446376), (21.631, -39.9345721541))
        make_face()
    extrude(amount=-F3_DEPTH)

    # F4 (on face) → F5 (cut)
    with BuildSketch(Plane.XY):
        with Locations((-0.4097813458, -2.9451847493)):
            Circle(F4_R)
        with Locations((-0.4097813458, -2.9451847493)):
            Circle(F4_R_2, mode=Mode.SUBTRACT)
        with BuildLine():
            ThreePointArc((0.5613541242, 8.5083885599), (-0.4056551824, 9.0128094008), (-1.3680046302, 8.4995541776))
            Line((-1.3680046302, 8.4995541776), (-13.1364011854, -8.8710766702))
            ThreePointArc((-13.1364011854, -8.8710766702), (-12.6284368081, -9.5223845688), (-11.8442001663, -9.7816193603))
            Line((-11.8442001663, -9.7816193603), (-0.8209832597, 6.4890960886))
            ThreePointArc((-0.8209832597, 6.4890960886), (-0.4080106872, 6.7093490647), (0.0069615684, 6.492887183))
            Line((0.0069615684, 6.492887183), (11.2515560359, -9.7816193603))
            ThreePointArc((11.2515560359, -9.7816193603), (12.050834777, -9.5294881376), (12.5694010689, -8.8710766702))
            Line((12.5694010689, -8.8710766702), (0.5613541242, 8.5083885599))
        make_face()
    extrude(amount=-F5_DEPTH, mode=Mode.SUBTRACT)

    # F6 (on face) → F7 (cut)
    with BuildSketch(Plane(origin=(0, 0, -2), x_dir=(1, 0, 0), z_dir=(0, 0, -1))):
        with Locations((-17.0656, -21.7392)):
            Circle(F6_R)
        with Locations((-13.5096, -21.7392)):
            Circle(F6_R)
        with Locations((16.7164, -21.7392)):
            Circle(F6_R)
    extrude(amount=-F7_DEPTH, mode=Mode.SUBTRACT)


solid = f1.part
